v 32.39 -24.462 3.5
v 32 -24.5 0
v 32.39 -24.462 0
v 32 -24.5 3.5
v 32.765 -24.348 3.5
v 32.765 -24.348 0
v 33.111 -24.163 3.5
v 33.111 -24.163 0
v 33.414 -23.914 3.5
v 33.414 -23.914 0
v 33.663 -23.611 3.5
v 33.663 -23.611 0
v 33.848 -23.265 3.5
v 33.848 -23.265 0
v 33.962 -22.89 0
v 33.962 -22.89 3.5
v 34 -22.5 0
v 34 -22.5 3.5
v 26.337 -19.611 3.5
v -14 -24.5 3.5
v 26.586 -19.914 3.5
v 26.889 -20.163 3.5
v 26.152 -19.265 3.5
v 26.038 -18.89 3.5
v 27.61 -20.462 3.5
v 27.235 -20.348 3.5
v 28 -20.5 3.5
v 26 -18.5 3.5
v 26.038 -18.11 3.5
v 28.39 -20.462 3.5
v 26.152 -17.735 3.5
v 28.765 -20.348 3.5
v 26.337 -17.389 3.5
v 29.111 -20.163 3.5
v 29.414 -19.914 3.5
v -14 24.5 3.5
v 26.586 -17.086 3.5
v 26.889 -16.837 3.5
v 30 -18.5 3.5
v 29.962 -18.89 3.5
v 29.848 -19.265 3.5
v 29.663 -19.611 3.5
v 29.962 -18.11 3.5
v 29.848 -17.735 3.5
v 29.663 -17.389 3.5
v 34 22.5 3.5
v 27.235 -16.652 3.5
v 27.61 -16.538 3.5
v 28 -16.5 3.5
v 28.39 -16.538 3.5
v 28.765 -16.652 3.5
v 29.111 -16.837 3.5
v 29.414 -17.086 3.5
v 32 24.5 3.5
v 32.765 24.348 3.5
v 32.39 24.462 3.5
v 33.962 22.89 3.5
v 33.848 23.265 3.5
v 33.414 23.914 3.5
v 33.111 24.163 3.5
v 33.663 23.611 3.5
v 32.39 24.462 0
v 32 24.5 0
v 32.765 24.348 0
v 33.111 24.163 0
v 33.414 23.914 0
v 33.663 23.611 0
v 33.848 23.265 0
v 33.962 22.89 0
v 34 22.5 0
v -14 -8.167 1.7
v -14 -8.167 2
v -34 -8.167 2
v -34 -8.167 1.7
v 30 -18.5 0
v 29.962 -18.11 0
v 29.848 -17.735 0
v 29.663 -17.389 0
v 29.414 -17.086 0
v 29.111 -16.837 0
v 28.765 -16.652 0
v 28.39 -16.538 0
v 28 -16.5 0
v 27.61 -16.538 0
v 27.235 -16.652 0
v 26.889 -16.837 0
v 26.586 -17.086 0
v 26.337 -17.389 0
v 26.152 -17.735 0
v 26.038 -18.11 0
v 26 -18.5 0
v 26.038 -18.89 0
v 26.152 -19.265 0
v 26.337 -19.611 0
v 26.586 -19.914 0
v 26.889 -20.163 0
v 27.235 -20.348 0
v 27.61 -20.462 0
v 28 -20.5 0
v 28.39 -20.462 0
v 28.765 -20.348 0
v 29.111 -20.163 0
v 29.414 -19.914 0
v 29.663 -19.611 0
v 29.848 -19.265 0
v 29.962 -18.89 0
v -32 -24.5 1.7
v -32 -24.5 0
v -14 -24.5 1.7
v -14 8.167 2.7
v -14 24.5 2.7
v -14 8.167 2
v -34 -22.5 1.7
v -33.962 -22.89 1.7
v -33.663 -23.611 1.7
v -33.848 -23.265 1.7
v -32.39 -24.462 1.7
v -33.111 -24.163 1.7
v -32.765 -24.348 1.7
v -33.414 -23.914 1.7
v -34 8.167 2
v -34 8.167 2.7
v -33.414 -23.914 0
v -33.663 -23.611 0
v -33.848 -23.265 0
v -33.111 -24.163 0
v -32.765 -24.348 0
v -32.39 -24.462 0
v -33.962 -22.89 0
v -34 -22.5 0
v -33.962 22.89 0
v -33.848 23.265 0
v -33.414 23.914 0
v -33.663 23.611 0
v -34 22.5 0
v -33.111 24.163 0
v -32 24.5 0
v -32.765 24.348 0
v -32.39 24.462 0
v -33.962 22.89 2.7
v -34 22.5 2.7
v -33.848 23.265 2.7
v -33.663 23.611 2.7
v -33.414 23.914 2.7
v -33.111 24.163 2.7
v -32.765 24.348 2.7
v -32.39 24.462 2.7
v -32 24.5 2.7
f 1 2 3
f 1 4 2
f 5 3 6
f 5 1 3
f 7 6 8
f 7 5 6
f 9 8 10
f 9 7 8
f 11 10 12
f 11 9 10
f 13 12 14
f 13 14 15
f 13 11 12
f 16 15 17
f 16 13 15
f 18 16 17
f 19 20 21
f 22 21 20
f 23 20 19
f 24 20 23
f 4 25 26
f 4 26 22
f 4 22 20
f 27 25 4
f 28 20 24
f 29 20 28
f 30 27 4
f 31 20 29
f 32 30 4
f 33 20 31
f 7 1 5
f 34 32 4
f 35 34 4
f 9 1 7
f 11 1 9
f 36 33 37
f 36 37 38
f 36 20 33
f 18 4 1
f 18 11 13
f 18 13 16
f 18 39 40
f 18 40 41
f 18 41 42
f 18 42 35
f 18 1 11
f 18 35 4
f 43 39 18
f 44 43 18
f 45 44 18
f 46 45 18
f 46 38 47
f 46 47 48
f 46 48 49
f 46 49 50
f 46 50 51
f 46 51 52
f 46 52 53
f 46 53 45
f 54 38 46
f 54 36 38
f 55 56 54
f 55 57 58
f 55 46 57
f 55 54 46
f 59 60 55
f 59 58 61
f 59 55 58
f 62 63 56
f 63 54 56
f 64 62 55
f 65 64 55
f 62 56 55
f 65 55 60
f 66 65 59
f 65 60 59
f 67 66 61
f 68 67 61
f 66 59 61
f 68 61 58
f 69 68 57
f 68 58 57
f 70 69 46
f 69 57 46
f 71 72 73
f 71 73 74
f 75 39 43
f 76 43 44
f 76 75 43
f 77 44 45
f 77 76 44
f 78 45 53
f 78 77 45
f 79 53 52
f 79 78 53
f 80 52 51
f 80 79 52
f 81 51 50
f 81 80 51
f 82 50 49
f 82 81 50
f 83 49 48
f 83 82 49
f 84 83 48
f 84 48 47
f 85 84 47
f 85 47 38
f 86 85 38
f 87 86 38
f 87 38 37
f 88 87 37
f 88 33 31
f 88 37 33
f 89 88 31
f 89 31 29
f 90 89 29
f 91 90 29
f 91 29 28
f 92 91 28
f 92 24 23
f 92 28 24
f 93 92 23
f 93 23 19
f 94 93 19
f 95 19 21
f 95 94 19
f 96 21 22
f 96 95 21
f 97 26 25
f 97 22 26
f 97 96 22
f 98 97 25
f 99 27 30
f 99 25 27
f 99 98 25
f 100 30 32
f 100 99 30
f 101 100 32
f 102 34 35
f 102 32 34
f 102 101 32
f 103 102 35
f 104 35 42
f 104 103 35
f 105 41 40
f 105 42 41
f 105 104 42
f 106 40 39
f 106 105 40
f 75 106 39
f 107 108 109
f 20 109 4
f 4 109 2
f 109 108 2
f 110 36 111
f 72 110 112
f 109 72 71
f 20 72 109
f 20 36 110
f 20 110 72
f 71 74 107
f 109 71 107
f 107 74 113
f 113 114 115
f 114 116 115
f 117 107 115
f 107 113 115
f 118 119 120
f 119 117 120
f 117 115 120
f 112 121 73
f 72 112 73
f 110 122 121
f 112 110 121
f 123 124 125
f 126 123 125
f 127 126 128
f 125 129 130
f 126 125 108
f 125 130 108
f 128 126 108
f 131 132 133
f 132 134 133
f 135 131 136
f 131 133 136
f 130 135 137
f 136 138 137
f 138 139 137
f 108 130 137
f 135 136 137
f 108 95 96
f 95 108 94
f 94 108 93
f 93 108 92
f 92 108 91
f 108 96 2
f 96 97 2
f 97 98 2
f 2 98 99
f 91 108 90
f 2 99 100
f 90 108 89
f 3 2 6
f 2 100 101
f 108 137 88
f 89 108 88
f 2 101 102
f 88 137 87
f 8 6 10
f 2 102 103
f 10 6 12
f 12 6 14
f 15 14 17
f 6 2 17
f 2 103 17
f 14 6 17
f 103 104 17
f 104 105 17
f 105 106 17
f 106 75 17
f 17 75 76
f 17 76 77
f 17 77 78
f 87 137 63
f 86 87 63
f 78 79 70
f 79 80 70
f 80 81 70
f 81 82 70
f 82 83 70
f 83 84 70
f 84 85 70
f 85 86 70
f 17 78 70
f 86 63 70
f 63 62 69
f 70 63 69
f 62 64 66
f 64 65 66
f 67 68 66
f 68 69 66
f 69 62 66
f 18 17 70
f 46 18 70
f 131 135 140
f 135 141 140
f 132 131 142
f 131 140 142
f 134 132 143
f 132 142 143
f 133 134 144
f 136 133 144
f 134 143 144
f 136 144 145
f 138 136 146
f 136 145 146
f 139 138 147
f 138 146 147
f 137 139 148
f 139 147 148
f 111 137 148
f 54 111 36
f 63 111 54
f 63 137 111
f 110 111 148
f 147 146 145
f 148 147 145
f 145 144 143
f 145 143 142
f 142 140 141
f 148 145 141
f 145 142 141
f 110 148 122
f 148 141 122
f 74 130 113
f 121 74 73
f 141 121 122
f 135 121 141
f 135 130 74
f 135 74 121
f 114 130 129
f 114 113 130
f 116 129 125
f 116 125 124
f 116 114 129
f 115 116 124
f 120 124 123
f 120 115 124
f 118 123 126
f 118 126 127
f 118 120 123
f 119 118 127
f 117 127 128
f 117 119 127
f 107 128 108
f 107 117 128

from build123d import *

# Parameters (mm, degrees)
F0_W     = 68
F0_H     = 49
F1_DEPTH = 3.5
F3_DEPTH = 20
F4_R     = 2
F5_DEPTH = 3.501
F6_R     = 2


with BuildPart() as f1:
    # F0 (on Top) → F1 (new body)
    with BuildSketch(Plane.XY):
        Rectangle(F0_W, F0_H)
    extrude(amount=F1_DEPTH)

    # F2 (on face) → F3 (cut)
    with BuildSketch(Plane(origin=(-34, 0, 0), x_dir=(0, -1, 0), z_dir=(-1, 0, 0))):
        Polygon((24.5, 3.5), (-24.5, 3.5), (-24.5, 2.7), (-8.166667, 2.7), (-8.166667, 2), (8.166667, 2), (8.166667, 1.7), (24.5, 1.7), align=None)
    extrude(amount=-F3_DEPTH, mode=Mode.SUBTRACT)

    # F4 (on Top) → F5 (cut, through all)
    with BuildSketch(Plane.XY):
        with Locations((28, -18.5)):
            Circle(F4_R)
    extrude(amount=F5_DEPTH, mode=Mode.SUBTRACT)

    # F6
    f6_edges = [f1.edges().sort_by_distance(p)[0] for p in [
        (34, 24.5, 1.75),
        (34, -24.5, 1.75),
        (-34, 24.5, 1.35),
        (-34, -24.5, 0.85),
    ]]
    fillet(f6_edges, radius=F6_R)


solid = f1.part
